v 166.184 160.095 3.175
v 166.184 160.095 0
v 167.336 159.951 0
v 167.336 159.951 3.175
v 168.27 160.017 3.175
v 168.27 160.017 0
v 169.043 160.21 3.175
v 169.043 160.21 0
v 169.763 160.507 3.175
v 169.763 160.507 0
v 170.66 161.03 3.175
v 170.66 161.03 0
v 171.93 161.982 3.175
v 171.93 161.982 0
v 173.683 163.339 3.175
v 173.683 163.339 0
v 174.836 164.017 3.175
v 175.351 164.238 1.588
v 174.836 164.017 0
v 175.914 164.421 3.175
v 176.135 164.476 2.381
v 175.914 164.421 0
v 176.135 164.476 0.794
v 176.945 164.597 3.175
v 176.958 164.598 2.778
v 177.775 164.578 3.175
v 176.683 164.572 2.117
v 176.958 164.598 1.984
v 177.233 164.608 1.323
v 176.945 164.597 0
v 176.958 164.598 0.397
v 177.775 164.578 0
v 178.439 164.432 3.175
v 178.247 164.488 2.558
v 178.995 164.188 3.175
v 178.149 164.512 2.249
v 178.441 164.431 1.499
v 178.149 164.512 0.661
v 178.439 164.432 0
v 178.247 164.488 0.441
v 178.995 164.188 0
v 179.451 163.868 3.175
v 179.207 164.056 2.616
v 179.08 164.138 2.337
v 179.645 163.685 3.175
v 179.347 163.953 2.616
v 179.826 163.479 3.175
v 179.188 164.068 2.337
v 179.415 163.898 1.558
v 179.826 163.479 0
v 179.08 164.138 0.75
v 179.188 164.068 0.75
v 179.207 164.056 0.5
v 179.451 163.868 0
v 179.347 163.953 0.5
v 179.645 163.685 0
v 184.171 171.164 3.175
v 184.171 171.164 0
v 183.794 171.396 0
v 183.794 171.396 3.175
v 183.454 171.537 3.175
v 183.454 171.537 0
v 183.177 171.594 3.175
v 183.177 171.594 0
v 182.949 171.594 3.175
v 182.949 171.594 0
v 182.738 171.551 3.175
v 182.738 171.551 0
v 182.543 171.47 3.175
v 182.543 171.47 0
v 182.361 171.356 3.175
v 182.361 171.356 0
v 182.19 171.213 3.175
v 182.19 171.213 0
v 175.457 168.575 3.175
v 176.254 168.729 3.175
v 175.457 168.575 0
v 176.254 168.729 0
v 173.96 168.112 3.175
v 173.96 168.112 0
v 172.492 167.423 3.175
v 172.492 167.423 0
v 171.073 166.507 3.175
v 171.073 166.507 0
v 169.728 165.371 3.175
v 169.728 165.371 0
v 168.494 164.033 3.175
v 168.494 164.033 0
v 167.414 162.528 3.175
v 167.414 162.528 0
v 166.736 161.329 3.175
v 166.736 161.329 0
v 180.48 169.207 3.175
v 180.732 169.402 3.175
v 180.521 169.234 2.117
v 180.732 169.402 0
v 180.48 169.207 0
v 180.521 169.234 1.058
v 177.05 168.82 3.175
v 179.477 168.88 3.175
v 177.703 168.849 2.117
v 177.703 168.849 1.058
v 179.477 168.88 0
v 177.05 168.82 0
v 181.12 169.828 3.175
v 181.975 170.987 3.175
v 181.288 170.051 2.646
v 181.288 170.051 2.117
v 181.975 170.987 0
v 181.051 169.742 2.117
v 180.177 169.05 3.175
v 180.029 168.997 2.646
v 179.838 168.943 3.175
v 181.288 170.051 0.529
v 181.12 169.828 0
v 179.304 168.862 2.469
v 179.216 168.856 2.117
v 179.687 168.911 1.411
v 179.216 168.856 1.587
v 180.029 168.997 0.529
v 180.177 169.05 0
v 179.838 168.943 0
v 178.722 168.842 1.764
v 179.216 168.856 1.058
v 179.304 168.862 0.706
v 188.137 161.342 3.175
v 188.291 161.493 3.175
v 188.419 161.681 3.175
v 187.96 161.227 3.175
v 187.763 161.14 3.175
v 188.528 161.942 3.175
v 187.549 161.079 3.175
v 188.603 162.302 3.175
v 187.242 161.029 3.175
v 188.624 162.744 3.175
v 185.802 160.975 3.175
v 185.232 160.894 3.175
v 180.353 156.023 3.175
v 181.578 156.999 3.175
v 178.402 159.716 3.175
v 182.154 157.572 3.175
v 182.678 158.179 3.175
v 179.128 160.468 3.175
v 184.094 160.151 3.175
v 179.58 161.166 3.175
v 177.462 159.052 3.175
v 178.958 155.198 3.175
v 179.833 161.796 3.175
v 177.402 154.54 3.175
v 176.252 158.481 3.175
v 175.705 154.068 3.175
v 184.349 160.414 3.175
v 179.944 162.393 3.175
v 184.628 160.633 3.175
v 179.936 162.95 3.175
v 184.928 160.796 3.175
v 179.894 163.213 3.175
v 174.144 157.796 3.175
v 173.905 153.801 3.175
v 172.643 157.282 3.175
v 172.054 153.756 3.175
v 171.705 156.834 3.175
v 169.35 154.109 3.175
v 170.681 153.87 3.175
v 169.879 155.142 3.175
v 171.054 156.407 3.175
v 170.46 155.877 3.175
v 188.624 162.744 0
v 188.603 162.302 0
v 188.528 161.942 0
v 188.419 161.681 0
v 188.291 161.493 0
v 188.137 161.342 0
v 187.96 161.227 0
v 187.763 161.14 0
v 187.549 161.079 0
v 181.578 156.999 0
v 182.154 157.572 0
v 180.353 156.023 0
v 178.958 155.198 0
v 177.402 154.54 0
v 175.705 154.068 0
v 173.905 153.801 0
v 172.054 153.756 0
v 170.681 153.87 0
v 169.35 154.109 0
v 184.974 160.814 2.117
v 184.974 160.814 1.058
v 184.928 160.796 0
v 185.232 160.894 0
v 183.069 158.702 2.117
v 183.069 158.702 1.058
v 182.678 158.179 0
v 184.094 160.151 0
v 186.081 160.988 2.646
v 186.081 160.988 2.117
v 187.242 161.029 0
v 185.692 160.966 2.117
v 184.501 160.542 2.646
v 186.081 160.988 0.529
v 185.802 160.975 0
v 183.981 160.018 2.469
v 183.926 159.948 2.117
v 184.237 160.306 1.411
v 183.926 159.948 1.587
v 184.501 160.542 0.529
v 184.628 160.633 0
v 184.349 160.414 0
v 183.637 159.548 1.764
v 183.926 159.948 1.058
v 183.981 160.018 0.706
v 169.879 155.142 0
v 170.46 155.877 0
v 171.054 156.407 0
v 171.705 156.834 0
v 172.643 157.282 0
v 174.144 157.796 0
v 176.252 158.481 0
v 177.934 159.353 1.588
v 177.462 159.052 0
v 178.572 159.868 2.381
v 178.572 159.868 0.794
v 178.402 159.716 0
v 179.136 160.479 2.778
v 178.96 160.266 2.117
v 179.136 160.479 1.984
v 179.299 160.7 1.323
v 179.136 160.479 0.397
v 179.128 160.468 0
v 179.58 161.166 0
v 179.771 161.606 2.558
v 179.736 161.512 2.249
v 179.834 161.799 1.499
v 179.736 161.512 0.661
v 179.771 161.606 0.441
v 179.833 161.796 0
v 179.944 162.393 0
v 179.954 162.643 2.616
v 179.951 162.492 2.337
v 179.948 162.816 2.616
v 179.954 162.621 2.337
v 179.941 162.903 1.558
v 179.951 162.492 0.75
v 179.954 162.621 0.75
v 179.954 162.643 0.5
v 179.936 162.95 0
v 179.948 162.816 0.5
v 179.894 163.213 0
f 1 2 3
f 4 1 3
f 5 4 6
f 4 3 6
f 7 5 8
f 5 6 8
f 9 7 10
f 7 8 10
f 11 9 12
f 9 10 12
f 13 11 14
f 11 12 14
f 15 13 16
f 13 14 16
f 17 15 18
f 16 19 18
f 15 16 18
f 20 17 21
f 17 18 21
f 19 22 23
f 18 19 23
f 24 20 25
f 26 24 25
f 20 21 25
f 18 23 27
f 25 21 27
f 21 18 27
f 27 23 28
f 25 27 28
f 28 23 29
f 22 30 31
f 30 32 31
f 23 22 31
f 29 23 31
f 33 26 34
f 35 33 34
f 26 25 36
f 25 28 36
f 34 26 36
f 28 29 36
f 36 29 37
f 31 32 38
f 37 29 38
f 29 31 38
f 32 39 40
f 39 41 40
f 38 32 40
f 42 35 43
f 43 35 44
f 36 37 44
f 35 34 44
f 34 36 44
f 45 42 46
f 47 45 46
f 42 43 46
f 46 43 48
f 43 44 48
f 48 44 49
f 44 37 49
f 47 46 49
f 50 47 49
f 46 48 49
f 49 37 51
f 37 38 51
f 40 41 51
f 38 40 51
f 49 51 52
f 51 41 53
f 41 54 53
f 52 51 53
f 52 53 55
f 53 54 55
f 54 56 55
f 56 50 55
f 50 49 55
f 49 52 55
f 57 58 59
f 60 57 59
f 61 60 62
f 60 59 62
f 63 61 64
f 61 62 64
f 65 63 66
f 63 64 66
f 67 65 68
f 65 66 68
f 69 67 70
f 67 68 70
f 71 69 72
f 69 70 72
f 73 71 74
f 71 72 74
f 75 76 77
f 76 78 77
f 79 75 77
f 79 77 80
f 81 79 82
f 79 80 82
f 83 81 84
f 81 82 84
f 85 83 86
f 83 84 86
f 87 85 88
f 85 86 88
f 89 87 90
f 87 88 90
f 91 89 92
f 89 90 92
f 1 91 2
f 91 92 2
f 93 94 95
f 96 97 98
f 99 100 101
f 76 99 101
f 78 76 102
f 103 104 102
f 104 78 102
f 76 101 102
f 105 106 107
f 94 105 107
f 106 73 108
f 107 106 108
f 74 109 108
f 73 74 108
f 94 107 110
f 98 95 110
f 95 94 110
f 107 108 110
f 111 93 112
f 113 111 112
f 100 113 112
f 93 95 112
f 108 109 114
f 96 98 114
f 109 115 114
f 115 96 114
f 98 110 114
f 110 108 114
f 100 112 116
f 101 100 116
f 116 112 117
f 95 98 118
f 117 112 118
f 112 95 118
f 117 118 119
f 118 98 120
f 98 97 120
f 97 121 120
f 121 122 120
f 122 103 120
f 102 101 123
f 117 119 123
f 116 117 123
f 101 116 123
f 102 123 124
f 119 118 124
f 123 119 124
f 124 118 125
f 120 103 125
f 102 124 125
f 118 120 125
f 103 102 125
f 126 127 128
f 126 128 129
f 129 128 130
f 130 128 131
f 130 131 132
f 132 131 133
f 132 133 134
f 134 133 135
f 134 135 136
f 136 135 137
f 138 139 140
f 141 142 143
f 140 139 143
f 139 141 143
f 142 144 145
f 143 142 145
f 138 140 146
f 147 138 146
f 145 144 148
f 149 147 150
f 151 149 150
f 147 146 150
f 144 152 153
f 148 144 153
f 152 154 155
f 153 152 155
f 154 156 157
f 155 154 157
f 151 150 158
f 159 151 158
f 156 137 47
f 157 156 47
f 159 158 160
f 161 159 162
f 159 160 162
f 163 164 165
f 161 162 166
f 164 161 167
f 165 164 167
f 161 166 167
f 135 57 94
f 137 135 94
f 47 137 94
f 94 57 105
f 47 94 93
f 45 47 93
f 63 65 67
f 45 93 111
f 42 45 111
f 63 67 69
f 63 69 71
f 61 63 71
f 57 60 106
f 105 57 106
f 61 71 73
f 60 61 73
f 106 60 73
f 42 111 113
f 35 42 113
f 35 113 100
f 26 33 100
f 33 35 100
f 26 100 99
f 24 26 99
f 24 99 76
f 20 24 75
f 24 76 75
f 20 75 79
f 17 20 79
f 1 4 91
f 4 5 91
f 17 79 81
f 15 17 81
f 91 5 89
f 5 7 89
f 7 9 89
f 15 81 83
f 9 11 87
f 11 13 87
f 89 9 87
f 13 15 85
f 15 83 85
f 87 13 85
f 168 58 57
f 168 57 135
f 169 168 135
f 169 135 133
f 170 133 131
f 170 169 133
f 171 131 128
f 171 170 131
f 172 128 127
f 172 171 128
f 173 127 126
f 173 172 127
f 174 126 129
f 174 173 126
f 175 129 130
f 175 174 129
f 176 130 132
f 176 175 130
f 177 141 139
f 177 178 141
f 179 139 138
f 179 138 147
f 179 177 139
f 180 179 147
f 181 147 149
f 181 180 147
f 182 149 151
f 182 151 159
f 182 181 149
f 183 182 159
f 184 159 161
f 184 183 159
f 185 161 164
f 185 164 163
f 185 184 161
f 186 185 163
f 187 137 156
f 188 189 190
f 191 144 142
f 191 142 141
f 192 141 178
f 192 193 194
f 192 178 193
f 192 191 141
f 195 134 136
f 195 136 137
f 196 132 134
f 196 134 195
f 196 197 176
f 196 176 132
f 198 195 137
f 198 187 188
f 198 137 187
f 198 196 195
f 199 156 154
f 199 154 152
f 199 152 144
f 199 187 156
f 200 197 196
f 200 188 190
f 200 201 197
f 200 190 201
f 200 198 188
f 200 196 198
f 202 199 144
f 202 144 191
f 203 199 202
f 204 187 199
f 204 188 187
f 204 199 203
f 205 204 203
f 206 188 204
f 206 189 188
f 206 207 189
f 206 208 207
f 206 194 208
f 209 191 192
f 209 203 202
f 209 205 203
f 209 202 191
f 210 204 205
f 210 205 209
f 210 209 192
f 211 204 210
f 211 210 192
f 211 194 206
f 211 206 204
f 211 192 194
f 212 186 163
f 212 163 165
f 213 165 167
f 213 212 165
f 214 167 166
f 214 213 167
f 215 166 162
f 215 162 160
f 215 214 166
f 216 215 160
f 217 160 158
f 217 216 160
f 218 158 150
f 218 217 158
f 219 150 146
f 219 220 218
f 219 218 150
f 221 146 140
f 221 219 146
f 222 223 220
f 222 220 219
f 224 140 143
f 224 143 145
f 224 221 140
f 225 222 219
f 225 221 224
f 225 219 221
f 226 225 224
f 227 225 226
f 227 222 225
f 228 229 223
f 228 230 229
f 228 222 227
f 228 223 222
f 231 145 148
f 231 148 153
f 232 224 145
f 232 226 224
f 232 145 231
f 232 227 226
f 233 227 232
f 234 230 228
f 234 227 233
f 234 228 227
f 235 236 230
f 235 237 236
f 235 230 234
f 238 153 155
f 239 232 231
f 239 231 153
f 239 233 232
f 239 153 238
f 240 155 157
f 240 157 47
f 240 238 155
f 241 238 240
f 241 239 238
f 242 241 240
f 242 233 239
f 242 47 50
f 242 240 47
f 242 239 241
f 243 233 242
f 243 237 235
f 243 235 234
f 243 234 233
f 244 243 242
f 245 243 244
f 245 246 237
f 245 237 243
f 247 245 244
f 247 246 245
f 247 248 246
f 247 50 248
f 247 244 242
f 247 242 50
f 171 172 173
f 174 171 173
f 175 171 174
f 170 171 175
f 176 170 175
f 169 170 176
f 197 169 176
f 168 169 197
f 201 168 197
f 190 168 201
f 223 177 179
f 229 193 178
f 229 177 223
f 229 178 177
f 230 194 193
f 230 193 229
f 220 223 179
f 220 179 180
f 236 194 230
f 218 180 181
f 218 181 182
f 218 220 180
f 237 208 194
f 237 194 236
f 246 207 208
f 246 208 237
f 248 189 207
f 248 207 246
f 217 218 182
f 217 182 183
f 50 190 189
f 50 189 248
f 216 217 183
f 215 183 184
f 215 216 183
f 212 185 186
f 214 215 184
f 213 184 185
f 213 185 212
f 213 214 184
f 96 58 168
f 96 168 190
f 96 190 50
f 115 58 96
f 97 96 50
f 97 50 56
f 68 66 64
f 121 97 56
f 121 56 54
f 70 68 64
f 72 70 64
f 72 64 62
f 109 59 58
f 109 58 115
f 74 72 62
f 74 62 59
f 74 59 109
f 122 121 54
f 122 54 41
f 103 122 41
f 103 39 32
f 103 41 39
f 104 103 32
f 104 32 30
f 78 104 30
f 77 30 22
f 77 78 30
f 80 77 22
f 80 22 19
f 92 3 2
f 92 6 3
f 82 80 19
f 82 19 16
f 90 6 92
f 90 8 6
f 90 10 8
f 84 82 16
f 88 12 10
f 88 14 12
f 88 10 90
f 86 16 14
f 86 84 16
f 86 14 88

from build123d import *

# Parameters (mm, degrees)
BOSS_EXTRUDE1_DEPTH = 3.175


with BuildPart() as part:
    # Sketch1 → Boss-Extrude1 (new body)
    with BuildSketch(Plane.XY):
        with BuildLine():
            Line((184.170901213, 171.16443677), (188.623811439, 162.744388343))
            add(Edge.make_bspline(
                [(188.623811439, 162.744388343), (188.663646352, 160.236577893), (184.920317244, 162.032555721), (181.133127764, 154.570416896), (174.078388586, 153.02227532), (169.349928801, 154.108528332)],
                knots=[0, 0, 0, 0, 0.207300481, 0.334319205, 1, 1, 1, 1], degree=3))
            add(Edge.make_bspline(
                [(169.349928801, 154.108528332), (170.941079424, 158.109537527), (176.997356853, 156.990356799), (180.330722428, 161.828121575), (179.826186231, 163.479274525)],
                knots=[0, 0, 0, 0, 0.681893717, 1, 1, 1, 1], degree=3))
            add(Edge.make_bspline(
                [(166.183974101, 160.095060855), (170.386575048, 159.158054893), (172.87057403, 164.793727954), (178.74545881, 164.825710963), (179.826186231, 163.479274525)],
                knots=[0, 0, 0, 0, 0.681893717, 1, 1, 1, 1], degree=3))
            add(Edge.make_bspline(
                [(184.170901213, 171.16443677), (182.120543743, 172.608990098), (181.497879866, 168.504073672), (173.198417299, 169.574233049), (167.947769761, 164.614718189), (166.183974101, 160.095060855)],
                knots=[0, 0, 0, 0, 0.207300481, 0.334319205, 1, 1, 1, 1], degree=3))
        make_face()
    extrude(amount=BOSS_EXTRUDE1_DEPTH)


solid = part.part
